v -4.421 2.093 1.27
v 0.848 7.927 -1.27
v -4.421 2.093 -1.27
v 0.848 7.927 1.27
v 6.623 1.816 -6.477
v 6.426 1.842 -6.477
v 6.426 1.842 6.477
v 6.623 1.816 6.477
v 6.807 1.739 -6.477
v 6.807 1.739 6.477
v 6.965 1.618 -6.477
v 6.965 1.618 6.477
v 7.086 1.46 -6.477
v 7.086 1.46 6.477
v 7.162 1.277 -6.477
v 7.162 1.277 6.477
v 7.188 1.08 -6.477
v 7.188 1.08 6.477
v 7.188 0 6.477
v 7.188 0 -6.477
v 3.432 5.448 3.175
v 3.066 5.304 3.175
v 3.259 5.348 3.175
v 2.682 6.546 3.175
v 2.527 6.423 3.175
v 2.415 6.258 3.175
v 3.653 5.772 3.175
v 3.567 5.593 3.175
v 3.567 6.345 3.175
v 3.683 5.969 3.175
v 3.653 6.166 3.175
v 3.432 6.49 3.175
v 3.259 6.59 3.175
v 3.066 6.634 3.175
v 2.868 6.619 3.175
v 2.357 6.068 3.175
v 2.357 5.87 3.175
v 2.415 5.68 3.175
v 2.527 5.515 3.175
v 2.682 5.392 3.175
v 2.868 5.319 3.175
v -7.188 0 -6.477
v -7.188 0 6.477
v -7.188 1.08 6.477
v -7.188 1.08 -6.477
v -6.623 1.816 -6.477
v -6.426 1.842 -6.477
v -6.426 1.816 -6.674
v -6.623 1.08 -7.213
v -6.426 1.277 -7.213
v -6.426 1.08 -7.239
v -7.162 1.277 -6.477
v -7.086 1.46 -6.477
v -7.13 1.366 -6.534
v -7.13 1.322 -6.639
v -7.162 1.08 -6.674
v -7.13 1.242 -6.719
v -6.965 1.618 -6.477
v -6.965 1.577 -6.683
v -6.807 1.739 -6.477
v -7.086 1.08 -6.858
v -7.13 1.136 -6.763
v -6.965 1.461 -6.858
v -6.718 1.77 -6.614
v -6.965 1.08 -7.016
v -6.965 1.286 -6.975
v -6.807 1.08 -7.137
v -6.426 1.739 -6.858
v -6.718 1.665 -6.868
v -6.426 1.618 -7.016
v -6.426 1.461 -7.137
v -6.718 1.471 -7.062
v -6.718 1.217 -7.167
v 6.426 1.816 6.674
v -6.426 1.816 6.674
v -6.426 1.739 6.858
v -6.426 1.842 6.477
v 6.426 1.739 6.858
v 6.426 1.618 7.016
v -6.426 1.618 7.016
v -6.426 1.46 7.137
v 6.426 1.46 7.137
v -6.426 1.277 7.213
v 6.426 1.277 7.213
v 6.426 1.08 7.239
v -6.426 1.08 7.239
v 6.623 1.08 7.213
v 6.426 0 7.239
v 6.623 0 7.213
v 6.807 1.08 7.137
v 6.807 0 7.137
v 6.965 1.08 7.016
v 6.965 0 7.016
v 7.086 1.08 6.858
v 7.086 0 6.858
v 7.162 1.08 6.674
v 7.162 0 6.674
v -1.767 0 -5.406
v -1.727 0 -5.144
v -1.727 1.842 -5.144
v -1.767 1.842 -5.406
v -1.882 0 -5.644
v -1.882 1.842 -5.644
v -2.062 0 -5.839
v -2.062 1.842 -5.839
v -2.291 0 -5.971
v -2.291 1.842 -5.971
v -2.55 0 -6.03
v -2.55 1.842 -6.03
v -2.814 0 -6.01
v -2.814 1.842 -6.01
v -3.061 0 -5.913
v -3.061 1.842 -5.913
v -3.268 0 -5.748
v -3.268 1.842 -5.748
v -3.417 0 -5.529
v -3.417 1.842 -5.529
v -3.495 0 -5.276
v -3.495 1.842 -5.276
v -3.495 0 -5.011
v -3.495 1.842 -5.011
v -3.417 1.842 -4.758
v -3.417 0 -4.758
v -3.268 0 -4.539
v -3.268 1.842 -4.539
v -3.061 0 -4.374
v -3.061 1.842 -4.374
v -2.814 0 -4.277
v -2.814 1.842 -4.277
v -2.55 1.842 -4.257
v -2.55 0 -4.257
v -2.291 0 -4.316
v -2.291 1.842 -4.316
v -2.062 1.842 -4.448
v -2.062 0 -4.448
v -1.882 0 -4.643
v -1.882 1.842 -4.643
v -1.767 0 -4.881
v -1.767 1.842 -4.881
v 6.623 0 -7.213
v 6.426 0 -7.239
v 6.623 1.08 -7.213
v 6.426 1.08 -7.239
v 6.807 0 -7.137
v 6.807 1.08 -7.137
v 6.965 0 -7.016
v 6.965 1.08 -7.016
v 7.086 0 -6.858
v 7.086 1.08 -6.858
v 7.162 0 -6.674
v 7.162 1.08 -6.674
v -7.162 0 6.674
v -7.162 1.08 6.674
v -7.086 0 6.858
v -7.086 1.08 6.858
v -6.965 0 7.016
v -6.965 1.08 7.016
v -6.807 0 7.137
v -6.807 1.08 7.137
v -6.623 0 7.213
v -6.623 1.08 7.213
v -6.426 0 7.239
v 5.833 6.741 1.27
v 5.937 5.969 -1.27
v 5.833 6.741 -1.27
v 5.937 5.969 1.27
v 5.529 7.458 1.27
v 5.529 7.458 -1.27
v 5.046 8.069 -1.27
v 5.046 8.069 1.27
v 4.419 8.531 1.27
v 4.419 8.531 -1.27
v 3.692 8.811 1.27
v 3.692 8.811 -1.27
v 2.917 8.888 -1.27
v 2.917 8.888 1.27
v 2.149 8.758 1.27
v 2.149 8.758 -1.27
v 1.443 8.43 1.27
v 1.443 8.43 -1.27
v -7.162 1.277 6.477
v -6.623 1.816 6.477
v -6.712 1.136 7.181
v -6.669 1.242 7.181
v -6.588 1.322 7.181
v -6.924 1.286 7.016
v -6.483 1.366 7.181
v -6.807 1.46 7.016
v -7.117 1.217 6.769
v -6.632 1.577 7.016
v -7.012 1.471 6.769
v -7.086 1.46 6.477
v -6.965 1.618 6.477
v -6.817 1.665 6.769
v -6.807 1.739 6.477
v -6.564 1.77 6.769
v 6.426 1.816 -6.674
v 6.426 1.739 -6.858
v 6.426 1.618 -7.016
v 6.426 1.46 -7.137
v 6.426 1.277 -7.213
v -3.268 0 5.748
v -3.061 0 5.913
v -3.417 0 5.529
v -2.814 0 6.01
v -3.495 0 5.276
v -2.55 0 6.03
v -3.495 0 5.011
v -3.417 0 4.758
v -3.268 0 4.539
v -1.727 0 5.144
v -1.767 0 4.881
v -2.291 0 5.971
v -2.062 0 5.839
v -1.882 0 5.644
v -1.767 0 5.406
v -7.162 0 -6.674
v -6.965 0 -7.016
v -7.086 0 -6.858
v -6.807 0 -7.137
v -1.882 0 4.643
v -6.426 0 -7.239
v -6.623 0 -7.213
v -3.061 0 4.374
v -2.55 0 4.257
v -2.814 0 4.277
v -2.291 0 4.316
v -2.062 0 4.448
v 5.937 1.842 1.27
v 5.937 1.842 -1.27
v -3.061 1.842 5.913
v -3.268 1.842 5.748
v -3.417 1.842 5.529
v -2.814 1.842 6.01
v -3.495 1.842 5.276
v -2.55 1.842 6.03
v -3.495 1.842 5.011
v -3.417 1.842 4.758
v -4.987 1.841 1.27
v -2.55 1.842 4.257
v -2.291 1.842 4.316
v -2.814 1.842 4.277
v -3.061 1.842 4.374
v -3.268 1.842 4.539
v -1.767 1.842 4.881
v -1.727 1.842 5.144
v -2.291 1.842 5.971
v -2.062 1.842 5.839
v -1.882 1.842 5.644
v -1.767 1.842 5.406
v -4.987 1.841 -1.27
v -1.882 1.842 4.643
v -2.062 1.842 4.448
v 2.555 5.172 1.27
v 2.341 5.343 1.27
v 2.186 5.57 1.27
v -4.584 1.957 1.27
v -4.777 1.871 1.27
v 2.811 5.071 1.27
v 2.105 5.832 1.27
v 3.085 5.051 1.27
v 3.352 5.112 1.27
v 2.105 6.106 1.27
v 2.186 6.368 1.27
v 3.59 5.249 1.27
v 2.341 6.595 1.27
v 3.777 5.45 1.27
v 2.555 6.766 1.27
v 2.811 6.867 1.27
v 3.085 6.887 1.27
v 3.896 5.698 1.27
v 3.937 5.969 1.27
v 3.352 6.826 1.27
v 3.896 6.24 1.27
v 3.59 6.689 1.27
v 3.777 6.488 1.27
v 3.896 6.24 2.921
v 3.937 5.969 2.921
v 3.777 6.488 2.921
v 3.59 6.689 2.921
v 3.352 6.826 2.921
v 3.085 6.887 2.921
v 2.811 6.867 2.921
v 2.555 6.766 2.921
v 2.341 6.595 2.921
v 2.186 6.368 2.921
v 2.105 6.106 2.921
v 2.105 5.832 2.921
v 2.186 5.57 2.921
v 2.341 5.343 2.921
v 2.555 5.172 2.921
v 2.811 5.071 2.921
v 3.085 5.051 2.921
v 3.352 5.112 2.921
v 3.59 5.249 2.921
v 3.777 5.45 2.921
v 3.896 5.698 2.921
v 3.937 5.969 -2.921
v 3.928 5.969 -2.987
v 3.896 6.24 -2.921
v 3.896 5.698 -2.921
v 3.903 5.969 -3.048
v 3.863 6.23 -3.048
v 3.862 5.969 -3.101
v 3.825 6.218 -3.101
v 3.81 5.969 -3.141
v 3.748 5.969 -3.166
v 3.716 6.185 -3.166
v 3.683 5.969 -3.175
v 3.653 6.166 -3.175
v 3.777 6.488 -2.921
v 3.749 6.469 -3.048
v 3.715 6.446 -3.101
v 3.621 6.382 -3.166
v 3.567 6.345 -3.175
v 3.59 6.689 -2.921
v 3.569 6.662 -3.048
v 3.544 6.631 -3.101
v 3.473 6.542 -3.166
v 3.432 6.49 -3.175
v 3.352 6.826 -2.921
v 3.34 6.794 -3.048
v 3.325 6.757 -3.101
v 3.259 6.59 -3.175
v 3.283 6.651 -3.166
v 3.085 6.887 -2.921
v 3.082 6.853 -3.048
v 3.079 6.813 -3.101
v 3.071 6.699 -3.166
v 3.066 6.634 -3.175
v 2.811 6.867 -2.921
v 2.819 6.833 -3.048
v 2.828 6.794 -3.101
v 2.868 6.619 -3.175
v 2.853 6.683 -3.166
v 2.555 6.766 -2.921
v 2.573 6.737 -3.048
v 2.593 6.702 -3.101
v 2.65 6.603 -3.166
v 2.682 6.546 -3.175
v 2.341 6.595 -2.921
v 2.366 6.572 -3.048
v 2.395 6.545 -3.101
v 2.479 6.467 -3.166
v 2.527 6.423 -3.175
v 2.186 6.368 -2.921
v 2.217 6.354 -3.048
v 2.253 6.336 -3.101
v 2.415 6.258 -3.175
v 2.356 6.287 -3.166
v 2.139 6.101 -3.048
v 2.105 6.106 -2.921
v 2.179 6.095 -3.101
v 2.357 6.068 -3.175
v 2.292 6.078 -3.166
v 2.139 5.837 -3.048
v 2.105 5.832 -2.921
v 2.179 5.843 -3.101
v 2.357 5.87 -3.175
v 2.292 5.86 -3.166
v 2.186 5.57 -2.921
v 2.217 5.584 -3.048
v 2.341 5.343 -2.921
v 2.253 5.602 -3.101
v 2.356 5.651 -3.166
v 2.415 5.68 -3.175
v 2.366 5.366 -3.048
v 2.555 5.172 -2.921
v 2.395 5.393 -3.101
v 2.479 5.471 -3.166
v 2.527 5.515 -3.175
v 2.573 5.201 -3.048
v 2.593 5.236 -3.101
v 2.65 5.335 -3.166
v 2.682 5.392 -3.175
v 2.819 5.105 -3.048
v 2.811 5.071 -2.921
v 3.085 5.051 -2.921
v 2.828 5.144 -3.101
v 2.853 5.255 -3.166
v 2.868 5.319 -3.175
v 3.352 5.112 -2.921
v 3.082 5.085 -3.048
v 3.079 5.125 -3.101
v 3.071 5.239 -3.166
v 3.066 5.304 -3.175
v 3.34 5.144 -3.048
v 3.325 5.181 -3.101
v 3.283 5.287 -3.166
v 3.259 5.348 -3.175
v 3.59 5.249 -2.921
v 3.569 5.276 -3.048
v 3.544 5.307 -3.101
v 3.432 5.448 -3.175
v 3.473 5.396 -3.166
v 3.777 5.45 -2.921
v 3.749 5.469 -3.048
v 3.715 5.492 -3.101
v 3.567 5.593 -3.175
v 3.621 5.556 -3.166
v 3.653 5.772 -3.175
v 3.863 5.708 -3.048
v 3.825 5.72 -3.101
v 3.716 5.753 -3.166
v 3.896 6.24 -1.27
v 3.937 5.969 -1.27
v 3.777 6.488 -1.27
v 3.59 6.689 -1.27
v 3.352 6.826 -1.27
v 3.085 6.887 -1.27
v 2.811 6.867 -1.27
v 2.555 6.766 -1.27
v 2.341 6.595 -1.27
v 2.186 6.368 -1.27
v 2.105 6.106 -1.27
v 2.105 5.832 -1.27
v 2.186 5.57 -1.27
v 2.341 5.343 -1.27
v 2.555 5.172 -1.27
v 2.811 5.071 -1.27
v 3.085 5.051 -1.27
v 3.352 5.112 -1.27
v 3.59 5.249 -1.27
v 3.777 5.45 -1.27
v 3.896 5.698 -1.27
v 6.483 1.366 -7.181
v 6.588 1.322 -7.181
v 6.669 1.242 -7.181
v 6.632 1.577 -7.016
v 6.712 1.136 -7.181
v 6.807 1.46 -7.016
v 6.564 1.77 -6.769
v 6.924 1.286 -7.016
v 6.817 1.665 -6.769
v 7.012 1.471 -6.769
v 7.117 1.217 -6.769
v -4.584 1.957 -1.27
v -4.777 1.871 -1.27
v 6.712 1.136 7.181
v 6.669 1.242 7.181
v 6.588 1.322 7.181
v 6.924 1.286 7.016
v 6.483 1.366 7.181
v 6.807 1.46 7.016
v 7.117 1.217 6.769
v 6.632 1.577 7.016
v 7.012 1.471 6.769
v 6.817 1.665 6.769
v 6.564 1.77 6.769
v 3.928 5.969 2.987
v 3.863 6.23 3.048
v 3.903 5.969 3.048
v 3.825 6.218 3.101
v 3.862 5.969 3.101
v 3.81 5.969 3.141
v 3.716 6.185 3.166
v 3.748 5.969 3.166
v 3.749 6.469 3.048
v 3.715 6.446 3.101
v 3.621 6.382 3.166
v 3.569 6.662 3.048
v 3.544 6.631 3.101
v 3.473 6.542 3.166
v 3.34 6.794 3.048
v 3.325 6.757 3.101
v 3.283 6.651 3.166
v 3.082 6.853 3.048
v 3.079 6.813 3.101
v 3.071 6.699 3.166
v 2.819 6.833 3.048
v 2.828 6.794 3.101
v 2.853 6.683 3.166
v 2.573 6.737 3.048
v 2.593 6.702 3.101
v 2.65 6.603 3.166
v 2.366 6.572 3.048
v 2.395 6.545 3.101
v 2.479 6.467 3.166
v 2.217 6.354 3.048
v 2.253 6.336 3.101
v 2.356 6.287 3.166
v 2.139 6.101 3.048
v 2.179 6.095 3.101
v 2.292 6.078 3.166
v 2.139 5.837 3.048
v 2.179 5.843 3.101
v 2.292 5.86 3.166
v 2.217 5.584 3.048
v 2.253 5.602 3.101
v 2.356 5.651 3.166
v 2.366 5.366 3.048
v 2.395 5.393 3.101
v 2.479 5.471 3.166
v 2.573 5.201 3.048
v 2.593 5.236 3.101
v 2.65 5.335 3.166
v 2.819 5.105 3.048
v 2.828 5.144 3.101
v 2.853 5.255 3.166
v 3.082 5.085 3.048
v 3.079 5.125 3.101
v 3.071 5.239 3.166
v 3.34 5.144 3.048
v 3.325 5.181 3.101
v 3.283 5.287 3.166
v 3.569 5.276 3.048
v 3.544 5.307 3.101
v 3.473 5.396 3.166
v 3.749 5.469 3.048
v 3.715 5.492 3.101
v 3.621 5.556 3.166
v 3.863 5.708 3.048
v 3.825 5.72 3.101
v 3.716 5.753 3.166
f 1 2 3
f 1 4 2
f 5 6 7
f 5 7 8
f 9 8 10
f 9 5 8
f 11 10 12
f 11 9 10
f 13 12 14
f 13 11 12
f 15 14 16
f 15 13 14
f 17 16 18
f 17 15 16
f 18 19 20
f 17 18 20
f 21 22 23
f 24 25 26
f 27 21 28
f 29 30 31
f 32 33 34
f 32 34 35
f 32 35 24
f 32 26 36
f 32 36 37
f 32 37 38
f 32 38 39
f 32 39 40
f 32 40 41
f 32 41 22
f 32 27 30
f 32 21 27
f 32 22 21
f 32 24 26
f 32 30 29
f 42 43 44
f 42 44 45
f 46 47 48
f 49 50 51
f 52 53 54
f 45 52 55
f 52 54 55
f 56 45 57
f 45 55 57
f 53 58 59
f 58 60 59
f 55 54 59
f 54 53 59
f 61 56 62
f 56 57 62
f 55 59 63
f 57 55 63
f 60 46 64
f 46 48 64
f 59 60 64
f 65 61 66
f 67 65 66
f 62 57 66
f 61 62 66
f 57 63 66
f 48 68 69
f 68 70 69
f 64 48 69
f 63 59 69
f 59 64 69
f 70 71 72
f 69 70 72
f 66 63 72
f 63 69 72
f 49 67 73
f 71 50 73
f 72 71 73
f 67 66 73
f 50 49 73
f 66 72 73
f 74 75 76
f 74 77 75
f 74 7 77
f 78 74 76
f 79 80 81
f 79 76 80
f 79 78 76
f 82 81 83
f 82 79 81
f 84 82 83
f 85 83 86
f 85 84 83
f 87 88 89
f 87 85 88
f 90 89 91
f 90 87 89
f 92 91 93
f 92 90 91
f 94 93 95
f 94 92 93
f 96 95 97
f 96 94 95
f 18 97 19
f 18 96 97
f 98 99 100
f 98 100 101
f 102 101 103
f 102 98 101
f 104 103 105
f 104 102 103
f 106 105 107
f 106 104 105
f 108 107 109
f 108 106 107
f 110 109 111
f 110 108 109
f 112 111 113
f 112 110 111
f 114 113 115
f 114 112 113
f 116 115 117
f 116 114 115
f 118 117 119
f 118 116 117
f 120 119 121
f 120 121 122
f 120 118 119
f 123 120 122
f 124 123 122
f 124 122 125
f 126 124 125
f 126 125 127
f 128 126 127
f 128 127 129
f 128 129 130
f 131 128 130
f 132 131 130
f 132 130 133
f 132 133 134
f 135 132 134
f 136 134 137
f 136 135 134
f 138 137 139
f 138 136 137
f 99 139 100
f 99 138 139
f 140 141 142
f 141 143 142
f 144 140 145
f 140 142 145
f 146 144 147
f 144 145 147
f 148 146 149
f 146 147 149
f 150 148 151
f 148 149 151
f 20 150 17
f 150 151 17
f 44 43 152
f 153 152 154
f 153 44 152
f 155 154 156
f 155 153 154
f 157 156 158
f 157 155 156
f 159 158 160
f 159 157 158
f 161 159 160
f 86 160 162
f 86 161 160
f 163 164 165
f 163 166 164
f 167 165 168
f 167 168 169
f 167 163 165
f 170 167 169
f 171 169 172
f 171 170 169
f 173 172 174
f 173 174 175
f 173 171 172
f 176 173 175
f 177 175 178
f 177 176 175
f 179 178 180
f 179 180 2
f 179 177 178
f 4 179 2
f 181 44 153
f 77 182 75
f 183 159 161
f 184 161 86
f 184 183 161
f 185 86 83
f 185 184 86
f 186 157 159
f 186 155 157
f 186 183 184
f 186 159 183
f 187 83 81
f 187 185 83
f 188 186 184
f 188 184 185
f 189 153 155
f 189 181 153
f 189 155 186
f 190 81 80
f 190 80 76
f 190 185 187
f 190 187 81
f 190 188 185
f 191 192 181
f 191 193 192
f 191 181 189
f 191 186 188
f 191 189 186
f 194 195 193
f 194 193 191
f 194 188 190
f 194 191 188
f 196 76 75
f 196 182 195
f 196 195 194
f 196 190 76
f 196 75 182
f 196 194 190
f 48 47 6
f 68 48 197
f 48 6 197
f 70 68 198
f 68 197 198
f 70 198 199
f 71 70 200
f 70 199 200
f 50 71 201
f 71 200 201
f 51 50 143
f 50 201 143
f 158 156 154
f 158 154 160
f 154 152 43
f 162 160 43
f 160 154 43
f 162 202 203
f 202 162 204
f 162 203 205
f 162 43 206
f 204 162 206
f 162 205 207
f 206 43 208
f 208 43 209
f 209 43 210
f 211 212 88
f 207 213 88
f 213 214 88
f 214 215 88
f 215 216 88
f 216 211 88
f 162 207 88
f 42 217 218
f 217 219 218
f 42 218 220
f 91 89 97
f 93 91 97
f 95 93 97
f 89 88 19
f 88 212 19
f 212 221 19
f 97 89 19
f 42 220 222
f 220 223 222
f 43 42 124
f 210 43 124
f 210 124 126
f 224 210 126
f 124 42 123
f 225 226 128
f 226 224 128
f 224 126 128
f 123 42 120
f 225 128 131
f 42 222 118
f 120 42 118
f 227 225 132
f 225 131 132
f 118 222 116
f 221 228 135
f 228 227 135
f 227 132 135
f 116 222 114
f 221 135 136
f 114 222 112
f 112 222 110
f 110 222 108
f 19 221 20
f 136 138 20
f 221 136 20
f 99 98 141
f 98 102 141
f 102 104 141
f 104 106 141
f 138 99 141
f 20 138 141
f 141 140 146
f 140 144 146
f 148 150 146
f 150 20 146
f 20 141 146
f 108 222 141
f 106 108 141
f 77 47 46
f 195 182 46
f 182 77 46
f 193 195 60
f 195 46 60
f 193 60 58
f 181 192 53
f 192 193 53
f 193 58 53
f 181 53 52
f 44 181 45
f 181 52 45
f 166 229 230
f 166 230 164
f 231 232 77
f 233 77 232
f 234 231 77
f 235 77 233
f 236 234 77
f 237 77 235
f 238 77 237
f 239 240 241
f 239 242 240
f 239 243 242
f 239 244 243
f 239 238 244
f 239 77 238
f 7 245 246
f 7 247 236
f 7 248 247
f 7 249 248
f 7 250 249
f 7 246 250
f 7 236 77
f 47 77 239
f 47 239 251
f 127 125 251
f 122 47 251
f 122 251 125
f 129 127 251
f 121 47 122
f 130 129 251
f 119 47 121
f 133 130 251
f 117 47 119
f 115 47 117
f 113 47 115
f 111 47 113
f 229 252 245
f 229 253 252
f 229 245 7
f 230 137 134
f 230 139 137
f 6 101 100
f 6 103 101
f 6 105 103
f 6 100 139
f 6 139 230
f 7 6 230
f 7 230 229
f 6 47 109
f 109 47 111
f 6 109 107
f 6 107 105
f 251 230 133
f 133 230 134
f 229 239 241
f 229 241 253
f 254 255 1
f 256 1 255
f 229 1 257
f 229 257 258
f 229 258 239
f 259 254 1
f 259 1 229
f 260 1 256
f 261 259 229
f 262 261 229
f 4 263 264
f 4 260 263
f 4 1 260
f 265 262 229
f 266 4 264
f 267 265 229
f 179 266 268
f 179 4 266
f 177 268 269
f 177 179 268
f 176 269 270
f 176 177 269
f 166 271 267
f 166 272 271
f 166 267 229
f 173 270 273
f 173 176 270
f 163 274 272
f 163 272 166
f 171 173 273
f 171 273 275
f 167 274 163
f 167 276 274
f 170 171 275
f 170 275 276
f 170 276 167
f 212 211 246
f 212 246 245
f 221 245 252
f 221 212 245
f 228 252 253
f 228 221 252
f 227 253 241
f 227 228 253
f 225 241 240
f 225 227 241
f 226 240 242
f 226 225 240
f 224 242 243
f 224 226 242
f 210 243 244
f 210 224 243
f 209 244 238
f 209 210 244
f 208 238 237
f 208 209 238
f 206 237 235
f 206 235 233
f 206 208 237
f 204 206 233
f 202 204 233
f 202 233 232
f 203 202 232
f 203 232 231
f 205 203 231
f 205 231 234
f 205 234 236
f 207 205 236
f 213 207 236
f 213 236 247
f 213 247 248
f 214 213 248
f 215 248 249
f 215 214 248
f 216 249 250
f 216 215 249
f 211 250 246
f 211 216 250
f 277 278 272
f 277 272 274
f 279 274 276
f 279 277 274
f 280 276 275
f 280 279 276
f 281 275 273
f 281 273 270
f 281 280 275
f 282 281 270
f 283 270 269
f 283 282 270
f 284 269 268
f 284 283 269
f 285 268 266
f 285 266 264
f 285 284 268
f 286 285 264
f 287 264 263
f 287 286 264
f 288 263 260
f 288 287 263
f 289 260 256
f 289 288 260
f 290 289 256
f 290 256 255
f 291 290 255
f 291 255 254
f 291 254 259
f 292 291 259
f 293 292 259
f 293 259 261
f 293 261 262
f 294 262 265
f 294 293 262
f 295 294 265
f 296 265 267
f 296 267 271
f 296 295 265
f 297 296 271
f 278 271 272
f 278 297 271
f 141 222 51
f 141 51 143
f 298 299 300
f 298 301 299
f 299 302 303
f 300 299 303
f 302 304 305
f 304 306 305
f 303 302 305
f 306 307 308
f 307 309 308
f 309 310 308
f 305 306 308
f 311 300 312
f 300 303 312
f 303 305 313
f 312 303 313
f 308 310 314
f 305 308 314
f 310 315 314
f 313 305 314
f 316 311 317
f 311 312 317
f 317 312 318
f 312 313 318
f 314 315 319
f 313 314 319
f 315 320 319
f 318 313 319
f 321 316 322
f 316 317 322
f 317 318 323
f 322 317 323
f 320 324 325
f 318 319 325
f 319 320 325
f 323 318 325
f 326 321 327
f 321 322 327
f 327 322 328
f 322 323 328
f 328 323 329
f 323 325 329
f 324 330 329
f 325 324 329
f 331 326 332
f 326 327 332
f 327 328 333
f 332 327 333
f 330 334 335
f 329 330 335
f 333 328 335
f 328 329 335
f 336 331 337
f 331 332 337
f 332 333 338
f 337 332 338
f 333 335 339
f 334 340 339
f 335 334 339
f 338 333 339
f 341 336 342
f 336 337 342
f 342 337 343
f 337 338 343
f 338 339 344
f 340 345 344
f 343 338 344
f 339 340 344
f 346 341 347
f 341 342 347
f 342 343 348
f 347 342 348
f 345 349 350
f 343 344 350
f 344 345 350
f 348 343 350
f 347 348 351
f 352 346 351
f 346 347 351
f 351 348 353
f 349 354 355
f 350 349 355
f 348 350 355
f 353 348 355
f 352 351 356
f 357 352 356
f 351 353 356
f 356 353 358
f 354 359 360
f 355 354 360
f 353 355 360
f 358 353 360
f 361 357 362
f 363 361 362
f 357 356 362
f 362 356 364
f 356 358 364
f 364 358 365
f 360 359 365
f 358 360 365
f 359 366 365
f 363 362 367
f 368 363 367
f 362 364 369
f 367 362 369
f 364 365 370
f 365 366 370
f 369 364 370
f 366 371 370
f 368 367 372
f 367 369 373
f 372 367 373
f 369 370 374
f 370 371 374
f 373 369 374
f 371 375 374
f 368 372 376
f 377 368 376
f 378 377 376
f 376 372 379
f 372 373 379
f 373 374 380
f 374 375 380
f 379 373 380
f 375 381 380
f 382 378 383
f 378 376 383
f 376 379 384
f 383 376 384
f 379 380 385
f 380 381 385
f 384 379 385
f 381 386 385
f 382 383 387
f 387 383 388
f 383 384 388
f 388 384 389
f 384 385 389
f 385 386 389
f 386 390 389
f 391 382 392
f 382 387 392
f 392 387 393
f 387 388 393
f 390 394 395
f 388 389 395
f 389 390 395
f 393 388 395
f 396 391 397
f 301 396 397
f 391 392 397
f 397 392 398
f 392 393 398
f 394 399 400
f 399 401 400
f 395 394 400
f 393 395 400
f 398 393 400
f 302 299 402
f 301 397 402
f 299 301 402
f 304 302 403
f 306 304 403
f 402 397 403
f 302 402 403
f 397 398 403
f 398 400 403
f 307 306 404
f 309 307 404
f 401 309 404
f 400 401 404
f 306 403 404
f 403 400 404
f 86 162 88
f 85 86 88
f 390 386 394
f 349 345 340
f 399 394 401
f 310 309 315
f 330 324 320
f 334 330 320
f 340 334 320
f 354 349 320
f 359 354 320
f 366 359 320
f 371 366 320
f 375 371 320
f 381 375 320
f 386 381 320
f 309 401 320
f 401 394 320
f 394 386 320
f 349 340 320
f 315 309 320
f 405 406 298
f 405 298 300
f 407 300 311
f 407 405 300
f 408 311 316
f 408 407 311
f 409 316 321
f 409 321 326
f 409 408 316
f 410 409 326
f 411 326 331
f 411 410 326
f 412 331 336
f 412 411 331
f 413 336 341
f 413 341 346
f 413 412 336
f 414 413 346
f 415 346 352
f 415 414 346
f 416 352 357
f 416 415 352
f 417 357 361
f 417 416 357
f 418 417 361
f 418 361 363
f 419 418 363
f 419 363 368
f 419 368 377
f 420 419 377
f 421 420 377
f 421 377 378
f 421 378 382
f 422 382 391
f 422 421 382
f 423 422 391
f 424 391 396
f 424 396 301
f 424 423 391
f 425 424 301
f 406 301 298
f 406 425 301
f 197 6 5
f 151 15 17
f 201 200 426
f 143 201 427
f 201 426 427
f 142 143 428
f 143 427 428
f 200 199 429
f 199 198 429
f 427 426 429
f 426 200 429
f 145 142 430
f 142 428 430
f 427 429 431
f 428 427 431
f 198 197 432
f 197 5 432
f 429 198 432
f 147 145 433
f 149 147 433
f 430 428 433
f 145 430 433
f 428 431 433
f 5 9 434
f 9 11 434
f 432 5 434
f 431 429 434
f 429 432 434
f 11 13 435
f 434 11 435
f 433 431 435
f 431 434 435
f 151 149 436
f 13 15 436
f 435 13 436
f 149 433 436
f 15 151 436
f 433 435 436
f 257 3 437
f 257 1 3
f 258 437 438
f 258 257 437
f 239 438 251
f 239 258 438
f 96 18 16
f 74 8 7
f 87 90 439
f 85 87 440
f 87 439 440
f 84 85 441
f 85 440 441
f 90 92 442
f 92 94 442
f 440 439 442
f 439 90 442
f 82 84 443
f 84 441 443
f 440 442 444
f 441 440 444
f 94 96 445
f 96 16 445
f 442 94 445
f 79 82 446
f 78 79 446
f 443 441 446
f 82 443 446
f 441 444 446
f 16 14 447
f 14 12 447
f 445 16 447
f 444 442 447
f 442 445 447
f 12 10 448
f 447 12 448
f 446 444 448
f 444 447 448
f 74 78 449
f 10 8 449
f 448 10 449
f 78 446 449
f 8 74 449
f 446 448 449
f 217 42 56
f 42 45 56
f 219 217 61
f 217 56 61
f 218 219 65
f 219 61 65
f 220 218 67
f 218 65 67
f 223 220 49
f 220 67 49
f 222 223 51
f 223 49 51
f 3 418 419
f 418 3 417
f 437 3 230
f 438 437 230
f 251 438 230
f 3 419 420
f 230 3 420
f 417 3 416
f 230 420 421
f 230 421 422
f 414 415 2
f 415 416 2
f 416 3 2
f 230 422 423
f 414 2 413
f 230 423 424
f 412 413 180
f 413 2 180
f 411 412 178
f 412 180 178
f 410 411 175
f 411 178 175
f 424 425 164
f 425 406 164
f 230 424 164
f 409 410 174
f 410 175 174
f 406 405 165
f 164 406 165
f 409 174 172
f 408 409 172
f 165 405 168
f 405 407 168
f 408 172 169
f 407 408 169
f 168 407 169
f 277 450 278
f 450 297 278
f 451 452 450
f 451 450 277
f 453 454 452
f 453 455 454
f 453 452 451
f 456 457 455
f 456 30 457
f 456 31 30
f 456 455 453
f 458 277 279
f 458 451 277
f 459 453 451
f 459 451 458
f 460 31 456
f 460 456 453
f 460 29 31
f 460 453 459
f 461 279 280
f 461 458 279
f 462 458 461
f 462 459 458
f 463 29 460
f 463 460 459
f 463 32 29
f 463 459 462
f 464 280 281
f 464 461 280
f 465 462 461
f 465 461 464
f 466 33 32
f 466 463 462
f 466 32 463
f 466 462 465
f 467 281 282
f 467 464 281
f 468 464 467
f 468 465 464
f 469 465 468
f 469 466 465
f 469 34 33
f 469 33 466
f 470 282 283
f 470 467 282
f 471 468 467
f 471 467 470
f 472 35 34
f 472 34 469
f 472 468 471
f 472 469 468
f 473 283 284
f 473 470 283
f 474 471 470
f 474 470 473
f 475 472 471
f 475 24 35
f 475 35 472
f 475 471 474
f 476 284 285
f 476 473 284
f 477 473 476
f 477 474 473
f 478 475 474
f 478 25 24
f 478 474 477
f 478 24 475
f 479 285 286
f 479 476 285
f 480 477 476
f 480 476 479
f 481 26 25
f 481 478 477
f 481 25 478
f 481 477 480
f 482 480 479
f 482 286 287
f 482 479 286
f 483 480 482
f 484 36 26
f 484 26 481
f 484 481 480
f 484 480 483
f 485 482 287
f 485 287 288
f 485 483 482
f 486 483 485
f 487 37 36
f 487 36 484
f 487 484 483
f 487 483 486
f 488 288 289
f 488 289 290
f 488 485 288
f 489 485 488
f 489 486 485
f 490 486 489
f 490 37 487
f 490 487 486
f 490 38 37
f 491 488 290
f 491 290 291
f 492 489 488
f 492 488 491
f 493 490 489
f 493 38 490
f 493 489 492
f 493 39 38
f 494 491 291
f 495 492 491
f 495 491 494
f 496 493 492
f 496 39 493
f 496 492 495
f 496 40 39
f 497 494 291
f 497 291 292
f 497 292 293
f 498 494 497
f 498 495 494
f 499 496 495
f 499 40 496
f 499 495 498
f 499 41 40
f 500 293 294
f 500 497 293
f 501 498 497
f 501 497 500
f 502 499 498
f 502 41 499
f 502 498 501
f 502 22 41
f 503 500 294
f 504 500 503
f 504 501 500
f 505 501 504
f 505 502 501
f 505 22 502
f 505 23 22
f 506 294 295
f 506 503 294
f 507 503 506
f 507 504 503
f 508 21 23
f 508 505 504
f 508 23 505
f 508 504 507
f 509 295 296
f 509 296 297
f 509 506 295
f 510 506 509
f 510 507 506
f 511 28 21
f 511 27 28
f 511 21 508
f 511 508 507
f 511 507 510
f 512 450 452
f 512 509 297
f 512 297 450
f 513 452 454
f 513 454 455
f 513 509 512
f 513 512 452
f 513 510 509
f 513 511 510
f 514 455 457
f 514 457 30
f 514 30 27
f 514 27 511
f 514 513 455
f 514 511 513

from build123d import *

# Parameters (mm, degrees)
SKETCH1_W           = 14.3764
SKETCH1_H           = 14.478
SKETCH1_R           = 0.889
BOSS_EXTRUDE1_DEPTH = 1.8415
SKETCH2_R           = 0.92075
BOSS_EXTRUDE2_DEPTH = 1.27
SKETCH2_4_R         = 0.92075
BOSS_EXTRUDE3_DEPTH = 3.175
FILLET1_R           = 0.762
FILLET2_R           = 0.254


with BuildPart() as part:
    # Sketch1 → Boss-Extrude1 (new body)
    with BuildSketch(Plane(origin=(0, 0, 0), x_dir=(1, 0, 0), z_dir=(0, 1, 0))):
        Rectangle(SKETCH1_W, SKETCH1_H)
        with Locations((-2.6162, 5.1435)):
            Circle(SKETCH1_R, mode=Mode.SUBTRACT)
        with Locations((-2.6162, -5.1435)):
            Circle(SKETCH1_R, mode=Mode.SUBTRACT)
    extrude(amount=BOSS_EXTRUDE1_DEPTH)

    # Sketch2 → Boss-Extrude2 (add, symmetric)
    with BuildSketch(Plane.XY):
        with BuildLine():
            Line((0.848172569, 7.926885609), (-4.6482, 1.8415))
            Line((-4.6482, 1.8415), (5.93687295, 1.8415))
            Line((5.93687295, 1.8415), (5.93687295, 5.969))
            ThreePointArc((5.93687295, 5.969), (4.064774324, 8.695178077), (0.848172569, 7.926885609))
        make_face()
        with Locations((3.01587295, 5.969)):
            Circle(SKETCH2_R, mode=Mode.SUBTRACT)
    extrude(amount=BOSS_EXTRUDE2_DEPTH, both=True)

    # Sketch2<4> → Boss-Extrude3 (add, symmetric)
    with BuildSketch(Plane.XY):
        with Locations((3.01587295, 5.969)):
            Circle(SKETCH2_4_R)
    extrude(amount=BOSS_EXTRUDE3_DEPTH, both=True)

    # Fillet1
    fillet1_edges = [part.edges().sort_by_distance(p)[0] for p in [
        (7.1882, 1.8415, 0),
        (0, 1.8415, -7.239),
        (-4.6482, 1.8415, 0),
        (-7.1882, 1.8415, 0),
        (-7.1882, 0.92075, -7.239),
        (7.1882, 0.92075, -7.239),
        (7.1882, 0.92075, 7.239),
        (-7.1882, 0.92075, 7.239),
        (0, 1.8415, 7.239),
    ]]
    fillet(fillet1_edges, radius=FILLET1_R)

    # Fillet2
    fillet2_edges = [part.edges().sort_by_distance(p)[0] for p in [
        (2.09512295, 5.969, -3.175),
        (2.09512295, 5.969, 3.175),
    ]]
    fillet(fillet2_edges, radius=FILLET2_R)


solid = part.part
